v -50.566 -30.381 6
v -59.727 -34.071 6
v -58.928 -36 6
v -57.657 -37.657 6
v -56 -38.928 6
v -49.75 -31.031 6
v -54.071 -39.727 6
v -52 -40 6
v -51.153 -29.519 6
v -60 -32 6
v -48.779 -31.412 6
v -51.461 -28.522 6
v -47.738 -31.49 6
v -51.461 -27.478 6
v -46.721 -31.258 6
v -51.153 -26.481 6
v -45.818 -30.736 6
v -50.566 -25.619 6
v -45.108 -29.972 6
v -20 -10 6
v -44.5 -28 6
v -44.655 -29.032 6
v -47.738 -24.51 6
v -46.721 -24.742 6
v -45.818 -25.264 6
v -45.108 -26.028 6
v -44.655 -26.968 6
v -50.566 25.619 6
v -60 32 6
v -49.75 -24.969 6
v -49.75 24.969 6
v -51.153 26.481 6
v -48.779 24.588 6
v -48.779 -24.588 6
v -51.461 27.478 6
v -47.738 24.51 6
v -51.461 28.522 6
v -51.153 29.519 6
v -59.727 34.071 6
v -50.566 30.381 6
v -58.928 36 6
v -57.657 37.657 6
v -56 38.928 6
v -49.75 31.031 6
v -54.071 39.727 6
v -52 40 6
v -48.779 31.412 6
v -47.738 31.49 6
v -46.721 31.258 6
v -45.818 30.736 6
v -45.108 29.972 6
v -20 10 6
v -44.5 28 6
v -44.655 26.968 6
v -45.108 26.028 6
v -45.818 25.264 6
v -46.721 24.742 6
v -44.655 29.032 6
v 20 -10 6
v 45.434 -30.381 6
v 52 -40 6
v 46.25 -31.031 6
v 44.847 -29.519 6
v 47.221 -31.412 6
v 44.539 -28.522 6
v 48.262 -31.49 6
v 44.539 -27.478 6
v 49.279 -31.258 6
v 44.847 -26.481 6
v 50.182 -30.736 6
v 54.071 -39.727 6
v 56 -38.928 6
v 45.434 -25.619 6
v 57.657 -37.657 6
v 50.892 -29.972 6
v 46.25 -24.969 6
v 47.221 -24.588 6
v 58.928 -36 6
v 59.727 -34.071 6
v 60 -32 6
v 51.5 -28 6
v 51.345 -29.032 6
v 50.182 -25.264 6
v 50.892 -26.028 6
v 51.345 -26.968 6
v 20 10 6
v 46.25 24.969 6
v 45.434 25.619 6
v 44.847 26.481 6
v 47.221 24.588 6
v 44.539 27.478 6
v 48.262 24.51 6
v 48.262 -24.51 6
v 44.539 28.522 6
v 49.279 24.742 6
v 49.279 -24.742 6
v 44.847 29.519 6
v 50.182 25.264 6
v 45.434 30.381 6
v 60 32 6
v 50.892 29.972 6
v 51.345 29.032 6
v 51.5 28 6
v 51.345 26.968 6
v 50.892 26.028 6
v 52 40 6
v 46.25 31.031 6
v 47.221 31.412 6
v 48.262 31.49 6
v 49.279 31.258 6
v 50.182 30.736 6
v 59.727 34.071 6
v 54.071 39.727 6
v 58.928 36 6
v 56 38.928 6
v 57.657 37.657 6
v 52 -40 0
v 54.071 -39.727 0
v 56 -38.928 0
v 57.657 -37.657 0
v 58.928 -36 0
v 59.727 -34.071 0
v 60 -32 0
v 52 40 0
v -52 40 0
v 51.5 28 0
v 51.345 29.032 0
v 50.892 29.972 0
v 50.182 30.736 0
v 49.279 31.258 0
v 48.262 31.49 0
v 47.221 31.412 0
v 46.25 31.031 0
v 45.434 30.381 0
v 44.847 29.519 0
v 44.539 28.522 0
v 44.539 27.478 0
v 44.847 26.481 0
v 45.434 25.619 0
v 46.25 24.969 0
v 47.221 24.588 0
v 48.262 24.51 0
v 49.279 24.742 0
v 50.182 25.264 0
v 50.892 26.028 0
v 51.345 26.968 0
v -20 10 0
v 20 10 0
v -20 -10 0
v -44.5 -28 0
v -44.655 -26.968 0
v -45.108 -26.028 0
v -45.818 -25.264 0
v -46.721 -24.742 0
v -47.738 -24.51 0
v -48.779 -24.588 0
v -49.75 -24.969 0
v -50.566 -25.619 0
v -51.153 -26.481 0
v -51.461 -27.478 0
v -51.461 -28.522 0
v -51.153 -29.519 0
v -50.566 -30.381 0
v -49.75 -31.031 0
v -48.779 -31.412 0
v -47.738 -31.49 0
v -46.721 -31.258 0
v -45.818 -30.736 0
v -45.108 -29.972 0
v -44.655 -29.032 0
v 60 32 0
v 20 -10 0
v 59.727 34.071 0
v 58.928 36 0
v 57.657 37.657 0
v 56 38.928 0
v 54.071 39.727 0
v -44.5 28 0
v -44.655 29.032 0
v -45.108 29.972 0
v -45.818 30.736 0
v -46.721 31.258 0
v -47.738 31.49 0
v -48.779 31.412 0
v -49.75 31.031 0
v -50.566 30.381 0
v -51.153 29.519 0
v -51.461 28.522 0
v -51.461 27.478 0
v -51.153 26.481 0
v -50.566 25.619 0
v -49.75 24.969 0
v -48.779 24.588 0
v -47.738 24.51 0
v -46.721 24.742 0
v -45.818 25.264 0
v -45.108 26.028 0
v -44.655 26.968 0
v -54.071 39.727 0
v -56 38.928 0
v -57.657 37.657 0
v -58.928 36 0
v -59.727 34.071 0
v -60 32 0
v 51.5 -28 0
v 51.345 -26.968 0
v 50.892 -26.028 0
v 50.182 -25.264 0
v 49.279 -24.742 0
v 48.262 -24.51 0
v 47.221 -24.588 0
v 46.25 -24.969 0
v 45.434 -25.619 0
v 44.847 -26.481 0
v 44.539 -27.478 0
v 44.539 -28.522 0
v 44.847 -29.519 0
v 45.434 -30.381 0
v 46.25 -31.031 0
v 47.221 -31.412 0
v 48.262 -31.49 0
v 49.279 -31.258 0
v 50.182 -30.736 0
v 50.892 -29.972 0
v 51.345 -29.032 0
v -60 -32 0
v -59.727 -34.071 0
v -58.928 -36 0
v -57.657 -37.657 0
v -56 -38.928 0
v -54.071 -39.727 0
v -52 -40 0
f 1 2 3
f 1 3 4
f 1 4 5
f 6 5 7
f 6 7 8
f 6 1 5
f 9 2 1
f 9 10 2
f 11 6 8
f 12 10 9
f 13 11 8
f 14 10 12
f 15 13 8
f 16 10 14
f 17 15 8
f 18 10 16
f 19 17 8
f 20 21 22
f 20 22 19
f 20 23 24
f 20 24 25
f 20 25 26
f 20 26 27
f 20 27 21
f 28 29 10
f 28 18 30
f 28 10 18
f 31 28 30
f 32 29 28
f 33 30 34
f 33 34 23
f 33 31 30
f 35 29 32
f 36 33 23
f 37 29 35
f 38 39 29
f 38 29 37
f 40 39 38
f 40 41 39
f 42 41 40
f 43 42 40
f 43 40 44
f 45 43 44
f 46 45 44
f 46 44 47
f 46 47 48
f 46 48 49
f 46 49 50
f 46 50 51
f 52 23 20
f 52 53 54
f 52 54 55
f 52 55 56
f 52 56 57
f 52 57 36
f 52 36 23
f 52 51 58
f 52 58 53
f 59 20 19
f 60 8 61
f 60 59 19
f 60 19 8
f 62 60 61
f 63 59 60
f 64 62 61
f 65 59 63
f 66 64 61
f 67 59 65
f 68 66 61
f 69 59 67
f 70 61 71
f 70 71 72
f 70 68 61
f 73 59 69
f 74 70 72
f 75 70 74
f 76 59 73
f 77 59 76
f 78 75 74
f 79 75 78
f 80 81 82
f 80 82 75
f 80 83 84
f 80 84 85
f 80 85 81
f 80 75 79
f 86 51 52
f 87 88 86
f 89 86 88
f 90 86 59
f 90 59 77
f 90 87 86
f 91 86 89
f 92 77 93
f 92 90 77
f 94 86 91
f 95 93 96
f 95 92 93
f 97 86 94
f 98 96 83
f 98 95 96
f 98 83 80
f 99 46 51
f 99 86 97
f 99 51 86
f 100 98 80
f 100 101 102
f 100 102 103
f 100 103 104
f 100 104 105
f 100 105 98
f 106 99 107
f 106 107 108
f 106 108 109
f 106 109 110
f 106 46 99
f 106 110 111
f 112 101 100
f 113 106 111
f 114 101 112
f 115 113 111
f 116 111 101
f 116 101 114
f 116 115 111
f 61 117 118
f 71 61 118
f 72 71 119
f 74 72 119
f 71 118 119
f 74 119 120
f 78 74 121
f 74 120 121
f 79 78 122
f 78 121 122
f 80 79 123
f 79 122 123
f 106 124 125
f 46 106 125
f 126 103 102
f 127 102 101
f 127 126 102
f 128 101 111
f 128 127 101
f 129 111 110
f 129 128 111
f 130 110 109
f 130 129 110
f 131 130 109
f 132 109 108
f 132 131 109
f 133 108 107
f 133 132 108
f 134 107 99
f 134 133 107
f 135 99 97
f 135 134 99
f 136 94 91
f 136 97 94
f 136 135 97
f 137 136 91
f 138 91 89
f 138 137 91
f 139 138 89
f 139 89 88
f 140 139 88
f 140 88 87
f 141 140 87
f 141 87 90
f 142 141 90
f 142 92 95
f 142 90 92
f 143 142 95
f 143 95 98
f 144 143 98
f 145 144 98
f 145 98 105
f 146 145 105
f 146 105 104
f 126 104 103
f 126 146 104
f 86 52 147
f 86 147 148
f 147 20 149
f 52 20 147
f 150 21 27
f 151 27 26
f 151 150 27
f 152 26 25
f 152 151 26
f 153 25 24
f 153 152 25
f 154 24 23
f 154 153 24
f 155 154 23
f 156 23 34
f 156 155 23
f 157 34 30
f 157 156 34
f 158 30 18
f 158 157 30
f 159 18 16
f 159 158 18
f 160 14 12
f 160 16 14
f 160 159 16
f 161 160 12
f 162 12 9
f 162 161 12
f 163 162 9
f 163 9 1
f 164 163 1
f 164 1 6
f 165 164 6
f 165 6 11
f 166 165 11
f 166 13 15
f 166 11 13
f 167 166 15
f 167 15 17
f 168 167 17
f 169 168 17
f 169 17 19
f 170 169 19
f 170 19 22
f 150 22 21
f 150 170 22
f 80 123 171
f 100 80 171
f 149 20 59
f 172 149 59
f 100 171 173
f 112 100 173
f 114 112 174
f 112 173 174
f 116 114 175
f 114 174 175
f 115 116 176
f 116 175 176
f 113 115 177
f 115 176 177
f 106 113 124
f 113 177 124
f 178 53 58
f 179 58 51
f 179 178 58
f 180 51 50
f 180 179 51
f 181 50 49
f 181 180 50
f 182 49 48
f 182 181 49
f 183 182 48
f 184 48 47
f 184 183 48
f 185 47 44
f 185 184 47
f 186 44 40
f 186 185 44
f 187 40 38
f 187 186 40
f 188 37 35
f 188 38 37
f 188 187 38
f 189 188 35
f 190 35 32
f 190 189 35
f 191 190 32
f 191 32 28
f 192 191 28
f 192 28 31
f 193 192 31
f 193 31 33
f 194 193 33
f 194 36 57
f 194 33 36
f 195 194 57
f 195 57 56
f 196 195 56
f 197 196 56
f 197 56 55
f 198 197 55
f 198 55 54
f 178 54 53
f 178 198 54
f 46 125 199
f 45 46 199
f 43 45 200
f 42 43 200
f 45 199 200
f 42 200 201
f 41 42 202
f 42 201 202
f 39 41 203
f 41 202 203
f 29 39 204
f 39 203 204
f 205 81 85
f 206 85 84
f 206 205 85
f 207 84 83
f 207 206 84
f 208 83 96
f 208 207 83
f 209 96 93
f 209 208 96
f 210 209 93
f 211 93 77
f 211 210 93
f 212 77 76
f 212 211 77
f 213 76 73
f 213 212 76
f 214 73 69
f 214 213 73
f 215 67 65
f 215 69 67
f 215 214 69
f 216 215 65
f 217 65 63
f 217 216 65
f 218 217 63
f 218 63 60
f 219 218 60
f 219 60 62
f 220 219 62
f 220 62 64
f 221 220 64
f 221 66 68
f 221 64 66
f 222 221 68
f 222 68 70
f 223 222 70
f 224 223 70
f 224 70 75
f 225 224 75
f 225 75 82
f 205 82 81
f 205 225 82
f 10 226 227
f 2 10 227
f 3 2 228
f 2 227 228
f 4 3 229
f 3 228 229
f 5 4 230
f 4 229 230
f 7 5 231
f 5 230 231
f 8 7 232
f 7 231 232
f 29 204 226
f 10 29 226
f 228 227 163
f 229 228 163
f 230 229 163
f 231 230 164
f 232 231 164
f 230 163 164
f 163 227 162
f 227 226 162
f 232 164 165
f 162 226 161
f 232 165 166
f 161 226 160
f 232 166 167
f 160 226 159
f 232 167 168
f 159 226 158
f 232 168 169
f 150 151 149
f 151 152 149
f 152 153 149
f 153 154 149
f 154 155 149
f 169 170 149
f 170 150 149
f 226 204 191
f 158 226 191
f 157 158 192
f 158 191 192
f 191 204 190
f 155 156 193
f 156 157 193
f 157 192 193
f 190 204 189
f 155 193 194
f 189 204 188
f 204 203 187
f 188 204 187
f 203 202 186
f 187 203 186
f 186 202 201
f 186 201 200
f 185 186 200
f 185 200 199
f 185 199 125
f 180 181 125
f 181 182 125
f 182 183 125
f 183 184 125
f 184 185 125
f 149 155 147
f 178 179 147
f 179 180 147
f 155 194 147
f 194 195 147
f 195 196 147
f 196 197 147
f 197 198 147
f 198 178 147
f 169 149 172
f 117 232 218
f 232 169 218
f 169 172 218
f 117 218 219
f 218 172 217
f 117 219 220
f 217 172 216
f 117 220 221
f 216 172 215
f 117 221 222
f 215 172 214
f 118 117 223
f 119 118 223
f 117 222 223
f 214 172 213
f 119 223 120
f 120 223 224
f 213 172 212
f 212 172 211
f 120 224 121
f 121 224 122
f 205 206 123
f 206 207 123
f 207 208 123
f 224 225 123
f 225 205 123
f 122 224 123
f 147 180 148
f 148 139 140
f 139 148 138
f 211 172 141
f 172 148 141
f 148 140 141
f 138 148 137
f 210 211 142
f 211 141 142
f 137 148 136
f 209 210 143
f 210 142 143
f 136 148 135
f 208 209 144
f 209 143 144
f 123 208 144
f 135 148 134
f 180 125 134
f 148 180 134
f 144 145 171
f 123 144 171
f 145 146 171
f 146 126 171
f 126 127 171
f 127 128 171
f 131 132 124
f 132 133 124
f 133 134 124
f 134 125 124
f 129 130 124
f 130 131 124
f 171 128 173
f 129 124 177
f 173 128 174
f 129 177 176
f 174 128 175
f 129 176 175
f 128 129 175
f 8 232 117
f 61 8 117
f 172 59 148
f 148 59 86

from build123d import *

# Parameters (mm, degrees)
EXTRUDE_1_DEPTH     = 6
SKETCH_2_R          = 3.5
CUT_EXTRUDE_1_DEPTH = 73.360210061
SKETCH_3_W          = 40
SKETCH_3_H          = 20
CUT_EXTRUDE_2_DEPTH = 121


with BuildPart() as part:
    # 草图1 → 凸台-拉伸1 (new body)
    with BuildSketch(Plane.XY):
        with BuildLine():
            Line((-52, -40), (52, -40))
            ThreePointArc((52, -40), (57.656854249, -37.656854249), (60, -32))
            Line((60, -32), (60, 32))
            ThreePointArc((60, 32), (57.656854249, 37.656854249), (52, 40))
            Line((52, 40), (-52, 40))
            ThreePointArc((-52, 40), (-57.656854249, 37.656854249), (-60, 32))
            Line((-60, 32), (-60, -32))
            ThreePointArc((-60, -32), (-57.656854249, -37.656854249), (-52, -40))
        make_face()
    extrude(amount=EXTRUDE_1_DEPTH)

    # 草图2 → 切除-拉伸1 (cut, through all)
    with BuildSketch(Plane.XY):
        with Locations((-48, -28)):
            Circle(SKETCH_2_R)
        with Locations((-48, 28)):
            Circle(SKETCH_2_R)
        with Locations((48, -28)):
            Circle(SKETCH_2_R)
        with Locations((48, 28)):
            Circle(SKETCH_2_R)
    extrude(amount=CUT_EXTRUDE_1_DEPTH, mode=Mode.SUBTRACT)

    # 草图3 → 切除-拉伸2 (cut, symmetric)
    with BuildSketch(Plane.XY):
        Rectangle(SKETCH_3_W, SKETCH_3_H)
    extrude(amount=CUT_EXTRUDE_2_DEPTH, both=True, mode=Mode.SUBTRACT)


solid = part.part
